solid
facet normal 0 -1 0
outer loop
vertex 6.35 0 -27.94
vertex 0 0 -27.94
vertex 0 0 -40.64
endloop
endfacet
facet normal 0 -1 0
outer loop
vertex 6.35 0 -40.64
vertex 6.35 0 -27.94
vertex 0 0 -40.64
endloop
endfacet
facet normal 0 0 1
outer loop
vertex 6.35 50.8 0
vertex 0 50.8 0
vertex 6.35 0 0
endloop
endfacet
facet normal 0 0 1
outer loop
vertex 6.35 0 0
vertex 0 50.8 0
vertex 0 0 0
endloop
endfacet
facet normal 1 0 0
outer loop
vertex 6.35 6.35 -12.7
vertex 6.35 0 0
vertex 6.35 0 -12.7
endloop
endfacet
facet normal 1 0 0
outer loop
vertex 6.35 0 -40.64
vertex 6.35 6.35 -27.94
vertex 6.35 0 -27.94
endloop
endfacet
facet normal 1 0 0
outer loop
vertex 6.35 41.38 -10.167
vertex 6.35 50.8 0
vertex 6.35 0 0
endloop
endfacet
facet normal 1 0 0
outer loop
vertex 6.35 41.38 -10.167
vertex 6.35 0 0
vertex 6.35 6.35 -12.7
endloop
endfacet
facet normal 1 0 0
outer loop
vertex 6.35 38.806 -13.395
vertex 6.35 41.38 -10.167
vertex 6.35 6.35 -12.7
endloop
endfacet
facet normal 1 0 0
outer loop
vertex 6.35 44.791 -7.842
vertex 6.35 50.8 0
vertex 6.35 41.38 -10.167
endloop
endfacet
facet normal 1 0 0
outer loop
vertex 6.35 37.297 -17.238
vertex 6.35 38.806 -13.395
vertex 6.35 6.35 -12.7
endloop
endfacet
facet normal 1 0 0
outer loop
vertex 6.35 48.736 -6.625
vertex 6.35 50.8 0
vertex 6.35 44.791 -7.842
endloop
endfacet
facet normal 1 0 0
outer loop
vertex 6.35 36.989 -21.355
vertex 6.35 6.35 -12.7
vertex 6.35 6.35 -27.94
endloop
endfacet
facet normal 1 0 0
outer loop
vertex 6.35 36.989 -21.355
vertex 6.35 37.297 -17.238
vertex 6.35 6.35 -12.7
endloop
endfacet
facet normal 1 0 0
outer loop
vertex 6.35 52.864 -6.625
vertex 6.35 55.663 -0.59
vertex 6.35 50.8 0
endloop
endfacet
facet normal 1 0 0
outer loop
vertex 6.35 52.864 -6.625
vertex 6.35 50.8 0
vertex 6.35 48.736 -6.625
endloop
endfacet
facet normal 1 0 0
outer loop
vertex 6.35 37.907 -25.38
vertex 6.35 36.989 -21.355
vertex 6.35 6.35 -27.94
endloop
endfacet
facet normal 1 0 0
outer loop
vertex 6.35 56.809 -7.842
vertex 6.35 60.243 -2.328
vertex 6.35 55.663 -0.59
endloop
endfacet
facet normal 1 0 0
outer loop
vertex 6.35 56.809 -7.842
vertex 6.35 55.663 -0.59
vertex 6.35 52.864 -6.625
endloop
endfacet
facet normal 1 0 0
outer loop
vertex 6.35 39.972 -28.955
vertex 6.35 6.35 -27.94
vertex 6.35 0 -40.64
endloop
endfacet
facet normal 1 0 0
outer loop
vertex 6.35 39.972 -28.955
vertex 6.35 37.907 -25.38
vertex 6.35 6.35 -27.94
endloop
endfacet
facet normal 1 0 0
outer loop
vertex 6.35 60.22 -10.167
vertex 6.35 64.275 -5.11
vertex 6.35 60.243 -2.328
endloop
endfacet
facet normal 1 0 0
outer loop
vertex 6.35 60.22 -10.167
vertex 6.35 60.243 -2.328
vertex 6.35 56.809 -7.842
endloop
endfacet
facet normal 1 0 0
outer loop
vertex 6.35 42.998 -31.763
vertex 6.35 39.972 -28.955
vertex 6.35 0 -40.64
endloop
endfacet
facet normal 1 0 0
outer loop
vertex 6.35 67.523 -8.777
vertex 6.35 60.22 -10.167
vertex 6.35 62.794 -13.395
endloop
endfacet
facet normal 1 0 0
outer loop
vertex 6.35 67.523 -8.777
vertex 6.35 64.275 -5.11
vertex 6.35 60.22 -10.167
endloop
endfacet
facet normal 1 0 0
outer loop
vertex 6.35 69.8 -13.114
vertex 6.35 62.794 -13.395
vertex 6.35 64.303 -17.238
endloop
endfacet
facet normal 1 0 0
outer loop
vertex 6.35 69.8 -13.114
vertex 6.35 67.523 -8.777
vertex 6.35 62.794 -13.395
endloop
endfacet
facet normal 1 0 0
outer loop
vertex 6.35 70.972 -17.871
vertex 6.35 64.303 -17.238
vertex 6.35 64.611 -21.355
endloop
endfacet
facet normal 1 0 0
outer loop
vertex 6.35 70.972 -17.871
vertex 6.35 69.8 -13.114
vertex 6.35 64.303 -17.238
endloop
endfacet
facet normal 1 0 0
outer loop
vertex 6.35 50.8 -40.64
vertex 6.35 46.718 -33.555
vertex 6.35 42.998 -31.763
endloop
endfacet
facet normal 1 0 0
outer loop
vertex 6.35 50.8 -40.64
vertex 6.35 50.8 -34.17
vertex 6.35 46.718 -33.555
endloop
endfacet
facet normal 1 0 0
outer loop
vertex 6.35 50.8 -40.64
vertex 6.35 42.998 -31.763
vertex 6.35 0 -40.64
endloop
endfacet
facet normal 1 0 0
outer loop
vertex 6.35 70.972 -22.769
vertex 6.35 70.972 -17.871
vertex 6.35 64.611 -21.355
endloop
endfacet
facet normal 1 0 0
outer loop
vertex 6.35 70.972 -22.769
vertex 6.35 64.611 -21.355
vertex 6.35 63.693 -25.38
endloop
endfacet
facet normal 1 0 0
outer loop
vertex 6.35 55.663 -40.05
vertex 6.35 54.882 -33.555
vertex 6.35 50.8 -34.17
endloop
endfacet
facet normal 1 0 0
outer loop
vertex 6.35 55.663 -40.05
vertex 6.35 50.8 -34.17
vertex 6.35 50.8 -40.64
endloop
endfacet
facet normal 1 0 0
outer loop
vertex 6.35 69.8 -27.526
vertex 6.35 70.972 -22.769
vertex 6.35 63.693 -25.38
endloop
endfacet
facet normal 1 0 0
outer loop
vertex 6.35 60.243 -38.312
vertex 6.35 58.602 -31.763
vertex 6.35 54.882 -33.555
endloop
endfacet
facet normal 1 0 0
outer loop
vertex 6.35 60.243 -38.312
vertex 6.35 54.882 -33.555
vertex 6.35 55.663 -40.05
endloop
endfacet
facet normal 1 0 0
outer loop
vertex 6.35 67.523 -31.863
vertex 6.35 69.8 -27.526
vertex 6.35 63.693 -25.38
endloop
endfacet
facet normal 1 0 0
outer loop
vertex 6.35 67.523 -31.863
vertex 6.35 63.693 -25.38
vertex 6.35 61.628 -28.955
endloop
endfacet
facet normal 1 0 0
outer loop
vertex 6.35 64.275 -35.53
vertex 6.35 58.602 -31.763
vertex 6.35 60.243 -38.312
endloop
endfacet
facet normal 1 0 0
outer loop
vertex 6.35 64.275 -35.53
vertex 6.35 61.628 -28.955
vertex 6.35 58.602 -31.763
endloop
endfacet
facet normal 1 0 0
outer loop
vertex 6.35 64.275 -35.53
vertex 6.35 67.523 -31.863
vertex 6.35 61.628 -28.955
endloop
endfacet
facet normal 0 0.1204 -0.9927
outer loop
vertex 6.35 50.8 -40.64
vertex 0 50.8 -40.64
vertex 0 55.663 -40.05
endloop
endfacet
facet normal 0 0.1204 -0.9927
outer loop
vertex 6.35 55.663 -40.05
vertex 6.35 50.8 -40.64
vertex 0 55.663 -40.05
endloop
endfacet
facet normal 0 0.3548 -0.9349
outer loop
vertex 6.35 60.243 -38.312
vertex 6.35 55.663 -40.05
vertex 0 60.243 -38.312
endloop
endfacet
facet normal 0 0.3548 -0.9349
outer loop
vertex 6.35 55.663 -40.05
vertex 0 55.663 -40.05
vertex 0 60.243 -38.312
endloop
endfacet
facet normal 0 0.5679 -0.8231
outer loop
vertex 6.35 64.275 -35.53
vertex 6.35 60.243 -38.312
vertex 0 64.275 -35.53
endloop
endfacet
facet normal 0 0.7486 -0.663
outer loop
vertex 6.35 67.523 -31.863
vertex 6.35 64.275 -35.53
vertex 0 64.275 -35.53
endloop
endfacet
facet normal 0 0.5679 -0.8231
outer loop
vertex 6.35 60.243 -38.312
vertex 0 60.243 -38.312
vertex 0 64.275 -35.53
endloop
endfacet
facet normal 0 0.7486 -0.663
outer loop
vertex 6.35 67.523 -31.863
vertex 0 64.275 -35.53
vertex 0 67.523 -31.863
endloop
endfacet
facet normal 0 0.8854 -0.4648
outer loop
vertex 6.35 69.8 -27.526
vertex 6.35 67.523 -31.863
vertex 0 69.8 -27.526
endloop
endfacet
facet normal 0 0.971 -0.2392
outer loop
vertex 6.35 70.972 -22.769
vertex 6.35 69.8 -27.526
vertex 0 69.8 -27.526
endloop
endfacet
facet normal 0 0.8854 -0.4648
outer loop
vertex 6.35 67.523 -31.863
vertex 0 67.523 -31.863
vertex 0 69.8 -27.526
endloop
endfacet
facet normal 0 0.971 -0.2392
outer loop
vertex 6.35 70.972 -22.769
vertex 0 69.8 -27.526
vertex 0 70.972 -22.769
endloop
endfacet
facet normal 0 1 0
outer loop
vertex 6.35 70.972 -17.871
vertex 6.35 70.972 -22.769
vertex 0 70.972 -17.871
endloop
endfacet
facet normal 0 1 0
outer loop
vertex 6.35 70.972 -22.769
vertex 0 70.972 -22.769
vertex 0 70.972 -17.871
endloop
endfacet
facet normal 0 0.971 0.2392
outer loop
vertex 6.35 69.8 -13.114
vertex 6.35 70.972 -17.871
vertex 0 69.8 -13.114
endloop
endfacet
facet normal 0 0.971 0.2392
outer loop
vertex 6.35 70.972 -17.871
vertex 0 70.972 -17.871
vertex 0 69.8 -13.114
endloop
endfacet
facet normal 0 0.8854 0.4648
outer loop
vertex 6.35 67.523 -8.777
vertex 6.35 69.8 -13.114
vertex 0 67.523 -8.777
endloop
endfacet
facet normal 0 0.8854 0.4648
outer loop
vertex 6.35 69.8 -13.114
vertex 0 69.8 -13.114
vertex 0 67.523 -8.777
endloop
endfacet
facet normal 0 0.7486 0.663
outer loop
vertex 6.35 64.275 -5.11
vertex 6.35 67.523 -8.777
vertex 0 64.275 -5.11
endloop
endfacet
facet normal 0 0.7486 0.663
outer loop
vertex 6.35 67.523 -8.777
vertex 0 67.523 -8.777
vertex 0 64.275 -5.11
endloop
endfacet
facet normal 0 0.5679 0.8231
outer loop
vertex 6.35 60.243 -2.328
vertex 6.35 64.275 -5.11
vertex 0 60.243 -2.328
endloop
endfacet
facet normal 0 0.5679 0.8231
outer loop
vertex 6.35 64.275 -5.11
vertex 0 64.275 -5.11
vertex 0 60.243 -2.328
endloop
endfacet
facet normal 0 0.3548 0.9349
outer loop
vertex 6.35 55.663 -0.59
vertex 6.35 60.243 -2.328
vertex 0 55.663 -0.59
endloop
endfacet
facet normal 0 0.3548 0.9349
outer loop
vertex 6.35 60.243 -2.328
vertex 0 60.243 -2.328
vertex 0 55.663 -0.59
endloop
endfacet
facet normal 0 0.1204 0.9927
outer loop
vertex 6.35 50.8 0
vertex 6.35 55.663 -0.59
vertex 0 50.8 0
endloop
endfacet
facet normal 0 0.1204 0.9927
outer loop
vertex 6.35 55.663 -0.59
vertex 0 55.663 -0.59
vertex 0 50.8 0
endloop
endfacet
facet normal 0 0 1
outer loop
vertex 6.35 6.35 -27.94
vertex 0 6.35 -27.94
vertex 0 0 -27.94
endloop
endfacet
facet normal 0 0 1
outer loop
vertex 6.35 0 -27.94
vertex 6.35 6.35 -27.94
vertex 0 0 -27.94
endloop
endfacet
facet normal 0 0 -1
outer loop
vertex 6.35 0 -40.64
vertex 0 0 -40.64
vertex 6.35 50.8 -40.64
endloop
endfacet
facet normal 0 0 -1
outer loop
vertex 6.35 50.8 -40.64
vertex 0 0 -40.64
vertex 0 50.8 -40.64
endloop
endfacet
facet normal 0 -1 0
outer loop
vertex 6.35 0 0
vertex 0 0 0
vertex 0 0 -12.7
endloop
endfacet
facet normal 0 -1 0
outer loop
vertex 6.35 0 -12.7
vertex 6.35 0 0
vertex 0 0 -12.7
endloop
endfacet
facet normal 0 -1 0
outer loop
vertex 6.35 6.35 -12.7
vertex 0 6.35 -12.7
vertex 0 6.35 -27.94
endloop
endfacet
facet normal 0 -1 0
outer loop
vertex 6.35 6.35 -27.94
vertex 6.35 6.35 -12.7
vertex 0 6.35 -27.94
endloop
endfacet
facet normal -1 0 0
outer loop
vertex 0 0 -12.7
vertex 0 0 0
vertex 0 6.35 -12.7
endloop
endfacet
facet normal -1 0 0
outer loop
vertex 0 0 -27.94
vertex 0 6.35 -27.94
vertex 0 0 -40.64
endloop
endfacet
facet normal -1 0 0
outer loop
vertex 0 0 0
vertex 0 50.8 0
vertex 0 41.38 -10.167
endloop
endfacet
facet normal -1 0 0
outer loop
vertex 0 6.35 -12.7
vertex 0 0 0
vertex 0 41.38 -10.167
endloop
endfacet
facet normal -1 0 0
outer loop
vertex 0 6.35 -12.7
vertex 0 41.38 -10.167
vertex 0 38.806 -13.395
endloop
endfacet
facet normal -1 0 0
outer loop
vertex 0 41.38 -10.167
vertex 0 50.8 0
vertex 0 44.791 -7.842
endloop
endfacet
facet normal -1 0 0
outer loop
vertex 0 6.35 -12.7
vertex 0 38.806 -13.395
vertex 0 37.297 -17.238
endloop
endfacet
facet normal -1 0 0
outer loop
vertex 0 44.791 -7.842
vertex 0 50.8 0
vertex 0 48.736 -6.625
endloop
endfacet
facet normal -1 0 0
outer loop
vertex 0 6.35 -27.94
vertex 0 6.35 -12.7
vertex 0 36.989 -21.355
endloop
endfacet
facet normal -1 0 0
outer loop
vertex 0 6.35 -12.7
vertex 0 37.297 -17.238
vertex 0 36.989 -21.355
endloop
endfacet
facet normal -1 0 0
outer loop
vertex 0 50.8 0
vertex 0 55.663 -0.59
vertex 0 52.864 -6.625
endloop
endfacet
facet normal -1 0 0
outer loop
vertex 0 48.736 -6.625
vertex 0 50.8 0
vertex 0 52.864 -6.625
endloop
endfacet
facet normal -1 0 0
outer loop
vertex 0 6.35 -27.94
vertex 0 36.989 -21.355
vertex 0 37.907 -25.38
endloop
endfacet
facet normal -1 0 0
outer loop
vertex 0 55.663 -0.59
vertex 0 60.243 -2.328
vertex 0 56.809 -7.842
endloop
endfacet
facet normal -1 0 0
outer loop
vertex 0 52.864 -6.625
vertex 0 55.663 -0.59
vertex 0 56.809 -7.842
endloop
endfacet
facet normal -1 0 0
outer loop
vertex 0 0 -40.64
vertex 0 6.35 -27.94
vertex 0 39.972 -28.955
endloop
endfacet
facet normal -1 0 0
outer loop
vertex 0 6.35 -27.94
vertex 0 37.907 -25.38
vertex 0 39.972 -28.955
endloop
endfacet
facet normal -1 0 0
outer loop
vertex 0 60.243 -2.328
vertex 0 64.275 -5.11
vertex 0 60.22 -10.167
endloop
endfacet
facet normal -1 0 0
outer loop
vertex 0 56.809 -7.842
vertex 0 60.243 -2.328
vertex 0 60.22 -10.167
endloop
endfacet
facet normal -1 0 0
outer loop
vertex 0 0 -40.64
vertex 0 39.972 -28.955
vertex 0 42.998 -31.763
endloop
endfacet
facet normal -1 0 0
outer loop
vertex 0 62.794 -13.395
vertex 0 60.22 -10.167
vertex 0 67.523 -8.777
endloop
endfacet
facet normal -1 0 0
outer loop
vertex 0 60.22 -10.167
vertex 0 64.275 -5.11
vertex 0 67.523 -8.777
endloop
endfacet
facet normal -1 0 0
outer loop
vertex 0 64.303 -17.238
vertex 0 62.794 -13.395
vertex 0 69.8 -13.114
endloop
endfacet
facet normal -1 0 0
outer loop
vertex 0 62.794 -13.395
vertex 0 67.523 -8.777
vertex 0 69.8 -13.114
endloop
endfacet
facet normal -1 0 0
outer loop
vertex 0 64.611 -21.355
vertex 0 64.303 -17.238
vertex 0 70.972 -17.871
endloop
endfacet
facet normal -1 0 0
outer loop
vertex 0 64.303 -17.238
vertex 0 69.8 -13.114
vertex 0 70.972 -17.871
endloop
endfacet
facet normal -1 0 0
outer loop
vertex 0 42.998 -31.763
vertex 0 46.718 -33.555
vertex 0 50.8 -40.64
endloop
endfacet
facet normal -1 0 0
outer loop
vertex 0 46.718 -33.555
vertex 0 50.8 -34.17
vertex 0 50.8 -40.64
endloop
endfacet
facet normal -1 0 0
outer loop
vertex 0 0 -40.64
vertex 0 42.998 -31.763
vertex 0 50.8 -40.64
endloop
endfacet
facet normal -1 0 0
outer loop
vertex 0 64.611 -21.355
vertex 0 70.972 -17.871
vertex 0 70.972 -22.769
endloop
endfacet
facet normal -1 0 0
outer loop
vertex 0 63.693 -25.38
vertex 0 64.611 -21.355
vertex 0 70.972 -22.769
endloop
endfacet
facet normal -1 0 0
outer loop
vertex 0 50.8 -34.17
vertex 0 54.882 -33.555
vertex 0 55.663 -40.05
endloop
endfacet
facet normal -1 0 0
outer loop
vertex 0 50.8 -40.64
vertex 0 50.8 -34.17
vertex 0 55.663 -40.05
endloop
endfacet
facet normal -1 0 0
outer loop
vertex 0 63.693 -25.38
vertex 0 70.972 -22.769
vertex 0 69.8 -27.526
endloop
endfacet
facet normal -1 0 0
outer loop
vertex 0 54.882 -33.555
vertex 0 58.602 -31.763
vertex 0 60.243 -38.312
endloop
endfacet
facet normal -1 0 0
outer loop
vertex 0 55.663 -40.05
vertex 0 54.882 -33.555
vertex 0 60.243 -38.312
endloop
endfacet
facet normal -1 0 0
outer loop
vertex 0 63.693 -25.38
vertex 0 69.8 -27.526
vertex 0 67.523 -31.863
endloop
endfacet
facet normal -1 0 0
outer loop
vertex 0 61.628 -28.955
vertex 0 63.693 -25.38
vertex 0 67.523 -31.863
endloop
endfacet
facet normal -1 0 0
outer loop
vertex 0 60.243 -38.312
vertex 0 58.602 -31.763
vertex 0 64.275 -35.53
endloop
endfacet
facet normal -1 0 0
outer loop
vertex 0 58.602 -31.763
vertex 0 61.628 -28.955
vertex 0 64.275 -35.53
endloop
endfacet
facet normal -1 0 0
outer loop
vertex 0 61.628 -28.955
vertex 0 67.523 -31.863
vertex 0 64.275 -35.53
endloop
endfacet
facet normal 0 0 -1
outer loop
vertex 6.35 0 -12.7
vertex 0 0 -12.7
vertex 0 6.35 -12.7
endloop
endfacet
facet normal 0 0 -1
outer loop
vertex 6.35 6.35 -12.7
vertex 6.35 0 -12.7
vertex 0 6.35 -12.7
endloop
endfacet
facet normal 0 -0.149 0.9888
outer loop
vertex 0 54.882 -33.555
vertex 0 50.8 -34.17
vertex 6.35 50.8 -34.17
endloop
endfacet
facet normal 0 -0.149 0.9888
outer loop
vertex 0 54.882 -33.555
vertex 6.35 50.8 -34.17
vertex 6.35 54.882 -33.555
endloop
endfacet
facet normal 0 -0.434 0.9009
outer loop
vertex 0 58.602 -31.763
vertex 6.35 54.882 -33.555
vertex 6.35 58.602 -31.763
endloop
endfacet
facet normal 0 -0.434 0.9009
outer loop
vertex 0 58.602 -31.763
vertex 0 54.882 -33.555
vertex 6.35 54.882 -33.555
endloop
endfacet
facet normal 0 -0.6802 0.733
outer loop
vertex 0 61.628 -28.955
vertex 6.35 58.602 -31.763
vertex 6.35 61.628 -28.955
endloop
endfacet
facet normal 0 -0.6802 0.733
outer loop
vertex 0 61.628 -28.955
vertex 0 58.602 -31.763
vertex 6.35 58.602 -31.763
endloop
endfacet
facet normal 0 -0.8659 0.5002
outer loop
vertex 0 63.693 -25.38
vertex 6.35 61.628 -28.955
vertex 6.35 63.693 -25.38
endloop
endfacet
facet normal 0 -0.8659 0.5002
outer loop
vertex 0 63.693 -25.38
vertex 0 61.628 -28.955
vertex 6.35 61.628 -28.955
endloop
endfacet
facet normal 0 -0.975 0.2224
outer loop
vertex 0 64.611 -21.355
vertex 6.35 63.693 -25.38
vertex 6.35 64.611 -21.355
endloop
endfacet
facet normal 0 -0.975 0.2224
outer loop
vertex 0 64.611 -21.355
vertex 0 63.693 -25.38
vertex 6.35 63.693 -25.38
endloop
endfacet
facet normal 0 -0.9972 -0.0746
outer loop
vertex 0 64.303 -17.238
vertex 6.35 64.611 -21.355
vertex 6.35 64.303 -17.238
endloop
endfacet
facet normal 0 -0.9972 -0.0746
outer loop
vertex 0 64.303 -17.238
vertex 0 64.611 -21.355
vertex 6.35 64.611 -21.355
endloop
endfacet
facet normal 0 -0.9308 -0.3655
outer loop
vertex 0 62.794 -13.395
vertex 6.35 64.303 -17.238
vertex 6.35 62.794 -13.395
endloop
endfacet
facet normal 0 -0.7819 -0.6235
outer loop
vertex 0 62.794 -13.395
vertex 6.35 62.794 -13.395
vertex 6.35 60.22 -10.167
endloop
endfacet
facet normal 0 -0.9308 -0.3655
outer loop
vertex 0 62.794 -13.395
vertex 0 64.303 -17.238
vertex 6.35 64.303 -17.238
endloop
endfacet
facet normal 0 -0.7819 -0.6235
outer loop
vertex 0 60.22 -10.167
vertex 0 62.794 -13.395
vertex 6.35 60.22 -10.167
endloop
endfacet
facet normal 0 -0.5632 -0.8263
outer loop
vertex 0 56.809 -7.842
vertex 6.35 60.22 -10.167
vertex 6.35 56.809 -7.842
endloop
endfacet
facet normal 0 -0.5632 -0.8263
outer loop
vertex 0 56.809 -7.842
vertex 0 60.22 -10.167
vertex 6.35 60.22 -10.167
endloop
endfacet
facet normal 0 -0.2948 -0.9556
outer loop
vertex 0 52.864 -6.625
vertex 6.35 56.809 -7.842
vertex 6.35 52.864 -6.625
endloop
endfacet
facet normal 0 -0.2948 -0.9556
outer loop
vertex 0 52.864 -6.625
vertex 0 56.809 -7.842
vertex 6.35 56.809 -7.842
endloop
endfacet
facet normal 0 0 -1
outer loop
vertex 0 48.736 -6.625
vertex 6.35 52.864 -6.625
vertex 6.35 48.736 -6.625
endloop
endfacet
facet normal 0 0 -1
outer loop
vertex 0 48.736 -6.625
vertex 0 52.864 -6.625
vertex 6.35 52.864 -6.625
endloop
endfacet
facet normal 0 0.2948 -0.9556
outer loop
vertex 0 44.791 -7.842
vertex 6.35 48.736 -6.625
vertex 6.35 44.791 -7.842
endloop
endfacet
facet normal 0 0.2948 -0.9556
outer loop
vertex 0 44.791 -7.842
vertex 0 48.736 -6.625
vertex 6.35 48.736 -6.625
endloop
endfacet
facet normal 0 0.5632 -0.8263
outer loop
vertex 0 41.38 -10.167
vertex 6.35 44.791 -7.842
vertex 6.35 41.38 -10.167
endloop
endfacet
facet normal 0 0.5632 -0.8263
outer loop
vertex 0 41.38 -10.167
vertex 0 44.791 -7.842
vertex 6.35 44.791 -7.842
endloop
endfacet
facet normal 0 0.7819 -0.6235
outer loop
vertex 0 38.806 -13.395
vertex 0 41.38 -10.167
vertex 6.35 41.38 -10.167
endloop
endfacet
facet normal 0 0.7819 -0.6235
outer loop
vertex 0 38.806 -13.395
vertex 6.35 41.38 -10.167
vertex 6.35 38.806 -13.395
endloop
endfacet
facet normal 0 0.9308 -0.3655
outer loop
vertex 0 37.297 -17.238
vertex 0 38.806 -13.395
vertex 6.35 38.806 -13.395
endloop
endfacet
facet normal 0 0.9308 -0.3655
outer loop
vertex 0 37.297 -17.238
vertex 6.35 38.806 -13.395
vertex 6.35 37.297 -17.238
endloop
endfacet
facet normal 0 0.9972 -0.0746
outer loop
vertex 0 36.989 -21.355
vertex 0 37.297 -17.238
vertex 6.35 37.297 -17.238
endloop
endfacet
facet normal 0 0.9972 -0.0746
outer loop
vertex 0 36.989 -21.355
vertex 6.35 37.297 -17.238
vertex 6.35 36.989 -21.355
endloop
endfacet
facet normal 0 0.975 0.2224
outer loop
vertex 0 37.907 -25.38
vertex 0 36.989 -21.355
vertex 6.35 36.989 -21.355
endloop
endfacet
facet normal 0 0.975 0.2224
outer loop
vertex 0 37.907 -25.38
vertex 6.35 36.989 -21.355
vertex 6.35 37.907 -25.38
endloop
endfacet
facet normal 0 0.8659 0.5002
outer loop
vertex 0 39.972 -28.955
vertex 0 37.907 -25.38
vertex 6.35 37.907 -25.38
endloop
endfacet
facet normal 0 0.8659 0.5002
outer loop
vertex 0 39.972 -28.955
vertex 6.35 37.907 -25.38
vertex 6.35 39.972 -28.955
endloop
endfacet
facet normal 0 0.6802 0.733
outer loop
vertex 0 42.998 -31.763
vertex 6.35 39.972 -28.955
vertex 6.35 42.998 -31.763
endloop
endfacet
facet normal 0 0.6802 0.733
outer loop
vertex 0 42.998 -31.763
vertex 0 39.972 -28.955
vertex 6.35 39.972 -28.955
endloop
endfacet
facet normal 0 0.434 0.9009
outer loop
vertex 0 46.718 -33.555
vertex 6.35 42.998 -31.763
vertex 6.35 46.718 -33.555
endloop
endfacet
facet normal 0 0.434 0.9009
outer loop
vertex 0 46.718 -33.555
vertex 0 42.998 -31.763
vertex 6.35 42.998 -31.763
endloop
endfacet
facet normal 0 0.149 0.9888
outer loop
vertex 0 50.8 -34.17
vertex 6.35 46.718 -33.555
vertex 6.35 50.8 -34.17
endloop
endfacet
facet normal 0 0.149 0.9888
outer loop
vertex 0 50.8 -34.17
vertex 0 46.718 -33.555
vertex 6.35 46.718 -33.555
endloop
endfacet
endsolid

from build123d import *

# Parameters (mm, degrees)
SKETCH1_R           = 13.85
BOSS_EXTRUDE1_DEPTH = 6.35


with BuildPart() as part:
    # Sketch1 → Boss-Extrude1 (new body)
    with BuildSketch(Plane(origin=(0, 0, 0), x_dir=(0, 0, -1), z_dir=(1, 0, 0))):
        with BuildLine():
            Line((27.94, 0), (40.64, 0))
            Line((40.64, 0), (40.64, 50.8))
            ThreePointArc((40.64, 50.8), (20.32, 71.12), (0, 50.8))
            Line((0, 50.8), (0, 0))
            Line((0, 0), (12.7, 0))
            Line((12.7, 0), (12.7, 6.35))
            Line((12.7, 6.35), (27.94, 6.35))
            Line((27.94, 6.35), (27.94, 0))
        make_face()
        with Locations((20.32, 50.8)):
            Circle(SKETCH1_R, mode=Mode.SUBTRACT)
    extrude(amount=BOSS_EXTRUDE1_DEPTH)


solid = part.part
